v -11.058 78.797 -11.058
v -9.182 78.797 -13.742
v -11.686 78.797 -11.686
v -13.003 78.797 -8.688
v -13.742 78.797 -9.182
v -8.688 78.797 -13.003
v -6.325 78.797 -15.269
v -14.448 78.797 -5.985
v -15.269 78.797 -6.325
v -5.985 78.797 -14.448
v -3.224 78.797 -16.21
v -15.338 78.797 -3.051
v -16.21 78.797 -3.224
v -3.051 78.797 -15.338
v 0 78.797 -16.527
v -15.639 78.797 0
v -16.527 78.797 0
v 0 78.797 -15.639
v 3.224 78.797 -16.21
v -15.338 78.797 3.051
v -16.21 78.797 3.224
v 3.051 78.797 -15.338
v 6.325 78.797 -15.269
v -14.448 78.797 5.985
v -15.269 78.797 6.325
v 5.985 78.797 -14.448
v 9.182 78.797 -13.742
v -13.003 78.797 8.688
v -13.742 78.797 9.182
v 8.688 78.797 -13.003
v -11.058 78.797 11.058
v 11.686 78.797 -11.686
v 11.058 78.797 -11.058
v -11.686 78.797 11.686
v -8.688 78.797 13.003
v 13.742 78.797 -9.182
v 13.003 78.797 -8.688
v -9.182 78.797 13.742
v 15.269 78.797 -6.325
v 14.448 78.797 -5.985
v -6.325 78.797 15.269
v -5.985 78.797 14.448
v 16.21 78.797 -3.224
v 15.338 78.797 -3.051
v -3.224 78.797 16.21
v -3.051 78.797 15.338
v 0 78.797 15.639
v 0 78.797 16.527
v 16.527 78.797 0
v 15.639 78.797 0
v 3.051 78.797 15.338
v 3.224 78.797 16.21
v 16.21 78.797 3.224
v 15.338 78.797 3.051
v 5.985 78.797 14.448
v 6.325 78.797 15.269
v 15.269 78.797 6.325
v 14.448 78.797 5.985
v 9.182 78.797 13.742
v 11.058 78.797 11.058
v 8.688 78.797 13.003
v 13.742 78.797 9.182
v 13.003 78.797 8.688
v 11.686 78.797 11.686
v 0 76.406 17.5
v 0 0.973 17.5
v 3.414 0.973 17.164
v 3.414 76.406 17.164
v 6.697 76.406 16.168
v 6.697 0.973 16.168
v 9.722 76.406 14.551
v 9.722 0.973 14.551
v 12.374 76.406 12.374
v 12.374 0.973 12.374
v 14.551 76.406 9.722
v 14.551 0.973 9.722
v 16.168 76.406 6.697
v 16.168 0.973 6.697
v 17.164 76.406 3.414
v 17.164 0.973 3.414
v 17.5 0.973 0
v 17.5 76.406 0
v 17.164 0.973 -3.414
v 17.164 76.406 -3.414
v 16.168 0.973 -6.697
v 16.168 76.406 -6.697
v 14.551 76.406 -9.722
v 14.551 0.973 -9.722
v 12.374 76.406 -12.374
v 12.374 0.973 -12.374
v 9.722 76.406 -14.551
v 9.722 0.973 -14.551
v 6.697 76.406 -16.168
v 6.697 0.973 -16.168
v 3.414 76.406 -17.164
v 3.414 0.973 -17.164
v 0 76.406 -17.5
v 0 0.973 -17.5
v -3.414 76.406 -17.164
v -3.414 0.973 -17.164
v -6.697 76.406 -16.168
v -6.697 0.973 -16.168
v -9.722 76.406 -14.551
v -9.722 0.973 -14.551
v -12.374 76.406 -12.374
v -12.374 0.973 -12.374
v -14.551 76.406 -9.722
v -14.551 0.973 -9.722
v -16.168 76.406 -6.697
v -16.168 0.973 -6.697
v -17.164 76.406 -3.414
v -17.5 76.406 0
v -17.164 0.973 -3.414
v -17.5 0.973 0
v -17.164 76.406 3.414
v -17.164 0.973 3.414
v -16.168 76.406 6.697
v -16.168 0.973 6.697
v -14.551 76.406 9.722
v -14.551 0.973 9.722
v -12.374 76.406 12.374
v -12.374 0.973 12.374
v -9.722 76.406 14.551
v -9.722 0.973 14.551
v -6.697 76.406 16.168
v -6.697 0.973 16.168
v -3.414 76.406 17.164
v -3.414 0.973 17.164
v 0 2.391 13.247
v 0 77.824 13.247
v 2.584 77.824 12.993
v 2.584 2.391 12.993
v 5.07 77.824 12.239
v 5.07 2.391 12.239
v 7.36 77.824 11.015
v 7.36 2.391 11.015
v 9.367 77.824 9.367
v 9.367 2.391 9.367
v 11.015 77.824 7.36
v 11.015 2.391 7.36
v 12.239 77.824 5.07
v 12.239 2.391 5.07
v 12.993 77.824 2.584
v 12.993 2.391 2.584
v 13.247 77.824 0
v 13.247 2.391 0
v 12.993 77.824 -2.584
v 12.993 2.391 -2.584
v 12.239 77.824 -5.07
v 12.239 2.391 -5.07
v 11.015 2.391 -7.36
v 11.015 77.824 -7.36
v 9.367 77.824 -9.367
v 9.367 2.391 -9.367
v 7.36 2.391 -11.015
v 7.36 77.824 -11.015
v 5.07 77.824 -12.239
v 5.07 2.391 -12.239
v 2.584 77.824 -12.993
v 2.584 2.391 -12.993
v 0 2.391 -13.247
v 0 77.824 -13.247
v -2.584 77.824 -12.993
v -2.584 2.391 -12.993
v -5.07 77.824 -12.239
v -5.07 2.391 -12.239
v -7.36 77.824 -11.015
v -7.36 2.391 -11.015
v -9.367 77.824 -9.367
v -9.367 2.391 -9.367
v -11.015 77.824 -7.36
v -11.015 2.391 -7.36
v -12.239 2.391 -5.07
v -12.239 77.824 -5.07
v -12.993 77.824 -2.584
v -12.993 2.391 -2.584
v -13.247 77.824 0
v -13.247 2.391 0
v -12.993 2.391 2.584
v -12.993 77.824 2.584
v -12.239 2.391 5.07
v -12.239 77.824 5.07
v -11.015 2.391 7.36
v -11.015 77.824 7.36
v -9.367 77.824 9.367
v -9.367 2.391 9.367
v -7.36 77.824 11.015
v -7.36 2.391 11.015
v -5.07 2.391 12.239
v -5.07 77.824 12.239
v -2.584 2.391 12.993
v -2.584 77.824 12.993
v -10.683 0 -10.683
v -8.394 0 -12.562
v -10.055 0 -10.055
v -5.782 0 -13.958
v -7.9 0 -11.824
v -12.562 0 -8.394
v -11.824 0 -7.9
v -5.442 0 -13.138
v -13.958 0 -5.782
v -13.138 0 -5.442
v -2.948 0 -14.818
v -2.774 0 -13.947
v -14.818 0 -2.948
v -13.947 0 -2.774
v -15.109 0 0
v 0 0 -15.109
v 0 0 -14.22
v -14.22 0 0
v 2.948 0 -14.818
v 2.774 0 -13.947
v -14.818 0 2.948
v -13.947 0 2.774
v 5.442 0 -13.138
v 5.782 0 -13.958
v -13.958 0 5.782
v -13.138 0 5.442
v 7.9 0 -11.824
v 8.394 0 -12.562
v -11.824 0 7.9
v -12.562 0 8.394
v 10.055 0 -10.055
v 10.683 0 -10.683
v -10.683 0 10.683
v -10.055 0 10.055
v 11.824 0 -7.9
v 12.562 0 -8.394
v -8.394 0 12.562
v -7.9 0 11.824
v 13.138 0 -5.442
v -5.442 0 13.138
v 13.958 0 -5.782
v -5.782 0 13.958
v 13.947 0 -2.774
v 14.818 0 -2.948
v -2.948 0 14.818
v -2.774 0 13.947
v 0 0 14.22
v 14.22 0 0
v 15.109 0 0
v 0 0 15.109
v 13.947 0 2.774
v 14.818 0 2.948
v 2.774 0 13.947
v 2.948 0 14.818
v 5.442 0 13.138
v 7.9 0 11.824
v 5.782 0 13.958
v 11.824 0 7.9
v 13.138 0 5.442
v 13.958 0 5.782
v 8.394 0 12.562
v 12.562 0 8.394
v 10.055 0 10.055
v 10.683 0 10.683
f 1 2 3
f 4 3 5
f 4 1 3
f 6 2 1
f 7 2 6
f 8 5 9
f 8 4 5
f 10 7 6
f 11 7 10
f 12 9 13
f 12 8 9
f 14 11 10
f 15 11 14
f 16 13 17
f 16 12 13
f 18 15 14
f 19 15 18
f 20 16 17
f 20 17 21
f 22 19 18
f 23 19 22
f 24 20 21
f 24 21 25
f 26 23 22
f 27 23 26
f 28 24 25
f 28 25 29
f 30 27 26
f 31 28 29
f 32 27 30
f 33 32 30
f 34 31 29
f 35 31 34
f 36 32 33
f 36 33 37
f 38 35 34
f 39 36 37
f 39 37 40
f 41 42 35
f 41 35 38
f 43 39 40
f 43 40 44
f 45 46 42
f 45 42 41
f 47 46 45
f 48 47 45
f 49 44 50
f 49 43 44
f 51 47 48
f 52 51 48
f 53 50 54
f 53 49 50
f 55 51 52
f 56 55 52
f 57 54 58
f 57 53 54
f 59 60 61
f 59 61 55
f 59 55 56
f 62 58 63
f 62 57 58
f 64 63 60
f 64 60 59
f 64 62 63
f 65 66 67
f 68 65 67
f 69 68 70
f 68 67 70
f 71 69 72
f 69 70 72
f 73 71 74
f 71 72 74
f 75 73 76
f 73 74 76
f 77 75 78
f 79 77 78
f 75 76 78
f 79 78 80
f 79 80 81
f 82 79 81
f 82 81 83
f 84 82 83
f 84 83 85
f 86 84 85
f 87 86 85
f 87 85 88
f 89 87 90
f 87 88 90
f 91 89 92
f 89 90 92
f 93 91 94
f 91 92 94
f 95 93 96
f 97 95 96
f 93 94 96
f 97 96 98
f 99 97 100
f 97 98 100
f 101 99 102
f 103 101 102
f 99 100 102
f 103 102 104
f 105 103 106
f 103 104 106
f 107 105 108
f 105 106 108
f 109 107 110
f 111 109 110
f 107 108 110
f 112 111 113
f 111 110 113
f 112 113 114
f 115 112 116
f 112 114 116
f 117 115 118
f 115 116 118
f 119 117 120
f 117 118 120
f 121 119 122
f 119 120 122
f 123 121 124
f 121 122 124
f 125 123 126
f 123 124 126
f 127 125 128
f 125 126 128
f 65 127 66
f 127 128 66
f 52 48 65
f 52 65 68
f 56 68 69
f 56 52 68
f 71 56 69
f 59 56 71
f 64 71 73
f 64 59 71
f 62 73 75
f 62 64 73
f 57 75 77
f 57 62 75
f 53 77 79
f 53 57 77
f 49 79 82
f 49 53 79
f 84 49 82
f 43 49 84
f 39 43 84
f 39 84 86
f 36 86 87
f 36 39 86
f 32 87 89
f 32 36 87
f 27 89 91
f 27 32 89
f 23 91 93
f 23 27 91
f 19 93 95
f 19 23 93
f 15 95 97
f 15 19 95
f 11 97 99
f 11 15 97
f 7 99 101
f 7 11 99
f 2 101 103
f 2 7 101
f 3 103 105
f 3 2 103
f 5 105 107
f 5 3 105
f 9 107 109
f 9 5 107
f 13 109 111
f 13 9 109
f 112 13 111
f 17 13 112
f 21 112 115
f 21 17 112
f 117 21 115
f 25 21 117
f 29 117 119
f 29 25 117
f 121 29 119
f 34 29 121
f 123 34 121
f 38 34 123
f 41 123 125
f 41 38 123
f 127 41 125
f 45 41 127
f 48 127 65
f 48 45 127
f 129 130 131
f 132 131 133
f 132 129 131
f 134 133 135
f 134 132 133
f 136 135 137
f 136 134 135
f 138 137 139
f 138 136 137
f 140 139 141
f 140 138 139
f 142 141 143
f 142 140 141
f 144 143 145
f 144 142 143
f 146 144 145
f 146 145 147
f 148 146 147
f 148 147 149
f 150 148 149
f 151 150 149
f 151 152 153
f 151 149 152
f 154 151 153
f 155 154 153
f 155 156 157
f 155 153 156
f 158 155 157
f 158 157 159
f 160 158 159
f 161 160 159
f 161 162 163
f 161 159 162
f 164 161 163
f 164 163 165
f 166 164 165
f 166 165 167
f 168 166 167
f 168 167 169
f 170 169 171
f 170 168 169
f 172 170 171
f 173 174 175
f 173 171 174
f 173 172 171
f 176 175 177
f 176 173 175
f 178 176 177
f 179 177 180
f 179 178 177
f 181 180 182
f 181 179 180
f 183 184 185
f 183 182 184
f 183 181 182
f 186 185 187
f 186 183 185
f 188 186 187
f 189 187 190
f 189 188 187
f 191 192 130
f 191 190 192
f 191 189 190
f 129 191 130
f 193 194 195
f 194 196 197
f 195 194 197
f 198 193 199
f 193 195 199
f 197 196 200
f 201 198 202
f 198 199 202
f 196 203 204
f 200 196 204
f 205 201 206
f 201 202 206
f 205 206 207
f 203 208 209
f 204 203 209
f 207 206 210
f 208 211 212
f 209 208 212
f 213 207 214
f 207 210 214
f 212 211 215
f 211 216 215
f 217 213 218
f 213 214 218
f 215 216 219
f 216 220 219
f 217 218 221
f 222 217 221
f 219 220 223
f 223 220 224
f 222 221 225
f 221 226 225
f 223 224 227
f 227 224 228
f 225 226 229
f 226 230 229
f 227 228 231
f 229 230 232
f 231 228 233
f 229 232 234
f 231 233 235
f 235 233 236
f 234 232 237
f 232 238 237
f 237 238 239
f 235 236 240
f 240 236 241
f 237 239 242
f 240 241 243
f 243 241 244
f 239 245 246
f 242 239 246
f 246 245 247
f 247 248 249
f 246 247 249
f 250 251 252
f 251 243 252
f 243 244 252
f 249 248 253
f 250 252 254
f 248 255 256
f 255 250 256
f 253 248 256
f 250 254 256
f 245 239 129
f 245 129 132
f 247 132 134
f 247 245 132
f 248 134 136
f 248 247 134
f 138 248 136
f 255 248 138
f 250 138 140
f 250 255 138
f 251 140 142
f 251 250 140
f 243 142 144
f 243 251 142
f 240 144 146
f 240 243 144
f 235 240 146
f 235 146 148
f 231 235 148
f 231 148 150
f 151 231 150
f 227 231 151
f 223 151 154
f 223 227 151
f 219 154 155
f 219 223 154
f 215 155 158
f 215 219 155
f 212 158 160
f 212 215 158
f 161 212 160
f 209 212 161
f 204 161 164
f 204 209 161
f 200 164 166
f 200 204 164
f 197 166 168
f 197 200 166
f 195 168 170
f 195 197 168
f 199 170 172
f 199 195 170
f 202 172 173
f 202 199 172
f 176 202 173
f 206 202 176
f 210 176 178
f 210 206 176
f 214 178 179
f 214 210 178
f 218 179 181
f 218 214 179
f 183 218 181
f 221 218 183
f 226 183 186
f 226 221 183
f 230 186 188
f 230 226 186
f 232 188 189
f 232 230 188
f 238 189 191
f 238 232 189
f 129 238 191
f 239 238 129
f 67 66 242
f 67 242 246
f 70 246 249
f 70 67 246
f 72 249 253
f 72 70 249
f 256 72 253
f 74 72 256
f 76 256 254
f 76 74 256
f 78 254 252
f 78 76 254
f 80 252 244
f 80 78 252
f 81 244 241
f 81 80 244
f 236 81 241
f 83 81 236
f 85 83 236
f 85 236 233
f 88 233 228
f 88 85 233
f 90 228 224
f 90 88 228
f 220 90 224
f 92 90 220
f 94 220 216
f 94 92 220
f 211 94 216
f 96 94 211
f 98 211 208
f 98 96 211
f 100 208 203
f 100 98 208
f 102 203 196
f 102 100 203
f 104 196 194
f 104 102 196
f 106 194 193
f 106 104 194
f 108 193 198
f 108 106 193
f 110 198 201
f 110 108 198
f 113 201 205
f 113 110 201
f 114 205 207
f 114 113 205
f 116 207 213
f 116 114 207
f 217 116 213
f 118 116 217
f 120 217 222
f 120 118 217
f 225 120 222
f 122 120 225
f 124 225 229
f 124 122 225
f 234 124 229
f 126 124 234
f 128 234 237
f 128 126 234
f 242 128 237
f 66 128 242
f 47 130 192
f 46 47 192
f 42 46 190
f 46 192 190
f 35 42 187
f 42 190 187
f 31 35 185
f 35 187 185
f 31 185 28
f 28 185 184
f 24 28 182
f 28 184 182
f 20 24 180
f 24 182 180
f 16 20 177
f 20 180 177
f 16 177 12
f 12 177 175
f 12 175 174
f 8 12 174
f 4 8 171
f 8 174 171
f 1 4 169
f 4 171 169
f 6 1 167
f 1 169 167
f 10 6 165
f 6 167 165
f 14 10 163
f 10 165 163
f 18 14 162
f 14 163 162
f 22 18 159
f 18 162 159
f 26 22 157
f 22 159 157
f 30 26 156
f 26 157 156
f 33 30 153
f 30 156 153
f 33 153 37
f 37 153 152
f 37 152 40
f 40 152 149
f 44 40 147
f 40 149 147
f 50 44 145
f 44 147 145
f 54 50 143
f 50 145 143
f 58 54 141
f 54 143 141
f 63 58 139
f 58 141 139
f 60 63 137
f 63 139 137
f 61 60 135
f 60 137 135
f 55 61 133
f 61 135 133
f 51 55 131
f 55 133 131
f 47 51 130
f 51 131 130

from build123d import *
from OCP.BRepFilletAPI import BRepFilletAPI_MakeChamfer

# Parameters (mm, degrees)
SKETCH1_R           = 17.5
BOSS_EXTRUDE1_DEPTH = 78.797027268
SKETCH2_R           = 13.247345897
CUT_EXTRUDE1_DEPTH  = 83.592200033
CHAMFER1_SIZE       = 2.391465007
CHAMFER1_SIZE2      = 0.972885823


with BuildPart() as part:
    # Sketch1 → Boss-Extrude1 (new body)
    with BuildSketch(Plane(origin=(0, 0, 0), x_dir=(1, 0, 0), z_dir=(0, 1, 0))):
        Circle(SKETCH1_R)
    extrude(amount=BOSS_EXTRUDE1_DEPTH)

    # Sketch2 → Cut-Extrude1 (cut, through all)
    with BuildSketch(Plane(origin=(0, 0, 0), x_dir=(1, 0, 0), z_dir=(0, 1, 0))):
        Circle(SKETCH2_R)
    extrude(amount=CUT_EXTRUDE1_DEPTH, mode=Mode.SUBTRACT)

    # Chamfer1: one chamfer whose edges measure the first distance from different faces: ONE call of the kernel's chamfer builder (chamfer() names one face for all edges)
    chamfer1_edges_1 = [part.edges().sort_by_distance(p)[0] for p in [
        (-13.247345897, 78.797027268, 0),
    ]]
    chamfer1_side_1 = [part.faces().sort_by_distance(p)[0] for p in [
        (-17.005025253, 78.797027268, 0),
    ]]
    chamfer1_edges_2 = [part.edges().sort_by_distance(p)[0] for p in [
        (-13.247345897, 0, 0),
    ]]
    chamfer1_side_2 = [part.faces().sort_by_distance(p)[0] for p in [
        (-13.247345897, 39.398513634, 0),
    ]]
    chamfer1_edges_3 = [part.edges().sort_by_distance(p)[0] for p in [
        (-17.5, 0, 0),
    ]]
    chamfer1_side_3 = [part.faces().sort_by_distance(p)[0] for p in [
        (-17.005025253, 0, 0),
    ]]
    chamfer1_edges_4 = [part.edges().sort_by_distance(p)[0] for p in [
        (-17.5, 78.797027268, 0),
    ]]
    chamfer1_side_4 = [part.faces().sort_by_distance(p)[0] for p in [
        (-17.5, 39.398513634, 0),
    ]]
    chamfer1 = BRepFilletAPI_MakeChamfer(part.part.solid().wrapped)
    for e in chamfer1_edges_1:
        chamfer1.Add(CHAMFER1_SIZE, CHAMFER1_SIZE2, e.wrapped, chamfer1_side_1[0].wrapped)  # the first distance lies on this face
    for e in chamfer1_edges_2:
        chamfer1.Add(CHAMFER1_SIZE, CHAMFER1_SIZE2, e.wrapped, chamfer1_side_2[0].wrapped)  # the first distance lies on this face
    for e in chamfer1_edges_3:
        chamfer1.Add(CHAMFER1_SIZE, CHAMFER1_SIZE2, e.wrapped, chamfer1_side_3[0].wrapped)  # the first distance lies on this face
    for e in chamfer1_edges_4:
        chamfer1.Add(CHAMFER1_SIZE, CHAMFER1_SIZE2, e.wrapped, chamfer1_side_4[0].wrapped)  # the first distance lies on this face
    add(Compound.cast(chamfer1.Shape()), mode=Mode.REPLACE)


solid = part.part
